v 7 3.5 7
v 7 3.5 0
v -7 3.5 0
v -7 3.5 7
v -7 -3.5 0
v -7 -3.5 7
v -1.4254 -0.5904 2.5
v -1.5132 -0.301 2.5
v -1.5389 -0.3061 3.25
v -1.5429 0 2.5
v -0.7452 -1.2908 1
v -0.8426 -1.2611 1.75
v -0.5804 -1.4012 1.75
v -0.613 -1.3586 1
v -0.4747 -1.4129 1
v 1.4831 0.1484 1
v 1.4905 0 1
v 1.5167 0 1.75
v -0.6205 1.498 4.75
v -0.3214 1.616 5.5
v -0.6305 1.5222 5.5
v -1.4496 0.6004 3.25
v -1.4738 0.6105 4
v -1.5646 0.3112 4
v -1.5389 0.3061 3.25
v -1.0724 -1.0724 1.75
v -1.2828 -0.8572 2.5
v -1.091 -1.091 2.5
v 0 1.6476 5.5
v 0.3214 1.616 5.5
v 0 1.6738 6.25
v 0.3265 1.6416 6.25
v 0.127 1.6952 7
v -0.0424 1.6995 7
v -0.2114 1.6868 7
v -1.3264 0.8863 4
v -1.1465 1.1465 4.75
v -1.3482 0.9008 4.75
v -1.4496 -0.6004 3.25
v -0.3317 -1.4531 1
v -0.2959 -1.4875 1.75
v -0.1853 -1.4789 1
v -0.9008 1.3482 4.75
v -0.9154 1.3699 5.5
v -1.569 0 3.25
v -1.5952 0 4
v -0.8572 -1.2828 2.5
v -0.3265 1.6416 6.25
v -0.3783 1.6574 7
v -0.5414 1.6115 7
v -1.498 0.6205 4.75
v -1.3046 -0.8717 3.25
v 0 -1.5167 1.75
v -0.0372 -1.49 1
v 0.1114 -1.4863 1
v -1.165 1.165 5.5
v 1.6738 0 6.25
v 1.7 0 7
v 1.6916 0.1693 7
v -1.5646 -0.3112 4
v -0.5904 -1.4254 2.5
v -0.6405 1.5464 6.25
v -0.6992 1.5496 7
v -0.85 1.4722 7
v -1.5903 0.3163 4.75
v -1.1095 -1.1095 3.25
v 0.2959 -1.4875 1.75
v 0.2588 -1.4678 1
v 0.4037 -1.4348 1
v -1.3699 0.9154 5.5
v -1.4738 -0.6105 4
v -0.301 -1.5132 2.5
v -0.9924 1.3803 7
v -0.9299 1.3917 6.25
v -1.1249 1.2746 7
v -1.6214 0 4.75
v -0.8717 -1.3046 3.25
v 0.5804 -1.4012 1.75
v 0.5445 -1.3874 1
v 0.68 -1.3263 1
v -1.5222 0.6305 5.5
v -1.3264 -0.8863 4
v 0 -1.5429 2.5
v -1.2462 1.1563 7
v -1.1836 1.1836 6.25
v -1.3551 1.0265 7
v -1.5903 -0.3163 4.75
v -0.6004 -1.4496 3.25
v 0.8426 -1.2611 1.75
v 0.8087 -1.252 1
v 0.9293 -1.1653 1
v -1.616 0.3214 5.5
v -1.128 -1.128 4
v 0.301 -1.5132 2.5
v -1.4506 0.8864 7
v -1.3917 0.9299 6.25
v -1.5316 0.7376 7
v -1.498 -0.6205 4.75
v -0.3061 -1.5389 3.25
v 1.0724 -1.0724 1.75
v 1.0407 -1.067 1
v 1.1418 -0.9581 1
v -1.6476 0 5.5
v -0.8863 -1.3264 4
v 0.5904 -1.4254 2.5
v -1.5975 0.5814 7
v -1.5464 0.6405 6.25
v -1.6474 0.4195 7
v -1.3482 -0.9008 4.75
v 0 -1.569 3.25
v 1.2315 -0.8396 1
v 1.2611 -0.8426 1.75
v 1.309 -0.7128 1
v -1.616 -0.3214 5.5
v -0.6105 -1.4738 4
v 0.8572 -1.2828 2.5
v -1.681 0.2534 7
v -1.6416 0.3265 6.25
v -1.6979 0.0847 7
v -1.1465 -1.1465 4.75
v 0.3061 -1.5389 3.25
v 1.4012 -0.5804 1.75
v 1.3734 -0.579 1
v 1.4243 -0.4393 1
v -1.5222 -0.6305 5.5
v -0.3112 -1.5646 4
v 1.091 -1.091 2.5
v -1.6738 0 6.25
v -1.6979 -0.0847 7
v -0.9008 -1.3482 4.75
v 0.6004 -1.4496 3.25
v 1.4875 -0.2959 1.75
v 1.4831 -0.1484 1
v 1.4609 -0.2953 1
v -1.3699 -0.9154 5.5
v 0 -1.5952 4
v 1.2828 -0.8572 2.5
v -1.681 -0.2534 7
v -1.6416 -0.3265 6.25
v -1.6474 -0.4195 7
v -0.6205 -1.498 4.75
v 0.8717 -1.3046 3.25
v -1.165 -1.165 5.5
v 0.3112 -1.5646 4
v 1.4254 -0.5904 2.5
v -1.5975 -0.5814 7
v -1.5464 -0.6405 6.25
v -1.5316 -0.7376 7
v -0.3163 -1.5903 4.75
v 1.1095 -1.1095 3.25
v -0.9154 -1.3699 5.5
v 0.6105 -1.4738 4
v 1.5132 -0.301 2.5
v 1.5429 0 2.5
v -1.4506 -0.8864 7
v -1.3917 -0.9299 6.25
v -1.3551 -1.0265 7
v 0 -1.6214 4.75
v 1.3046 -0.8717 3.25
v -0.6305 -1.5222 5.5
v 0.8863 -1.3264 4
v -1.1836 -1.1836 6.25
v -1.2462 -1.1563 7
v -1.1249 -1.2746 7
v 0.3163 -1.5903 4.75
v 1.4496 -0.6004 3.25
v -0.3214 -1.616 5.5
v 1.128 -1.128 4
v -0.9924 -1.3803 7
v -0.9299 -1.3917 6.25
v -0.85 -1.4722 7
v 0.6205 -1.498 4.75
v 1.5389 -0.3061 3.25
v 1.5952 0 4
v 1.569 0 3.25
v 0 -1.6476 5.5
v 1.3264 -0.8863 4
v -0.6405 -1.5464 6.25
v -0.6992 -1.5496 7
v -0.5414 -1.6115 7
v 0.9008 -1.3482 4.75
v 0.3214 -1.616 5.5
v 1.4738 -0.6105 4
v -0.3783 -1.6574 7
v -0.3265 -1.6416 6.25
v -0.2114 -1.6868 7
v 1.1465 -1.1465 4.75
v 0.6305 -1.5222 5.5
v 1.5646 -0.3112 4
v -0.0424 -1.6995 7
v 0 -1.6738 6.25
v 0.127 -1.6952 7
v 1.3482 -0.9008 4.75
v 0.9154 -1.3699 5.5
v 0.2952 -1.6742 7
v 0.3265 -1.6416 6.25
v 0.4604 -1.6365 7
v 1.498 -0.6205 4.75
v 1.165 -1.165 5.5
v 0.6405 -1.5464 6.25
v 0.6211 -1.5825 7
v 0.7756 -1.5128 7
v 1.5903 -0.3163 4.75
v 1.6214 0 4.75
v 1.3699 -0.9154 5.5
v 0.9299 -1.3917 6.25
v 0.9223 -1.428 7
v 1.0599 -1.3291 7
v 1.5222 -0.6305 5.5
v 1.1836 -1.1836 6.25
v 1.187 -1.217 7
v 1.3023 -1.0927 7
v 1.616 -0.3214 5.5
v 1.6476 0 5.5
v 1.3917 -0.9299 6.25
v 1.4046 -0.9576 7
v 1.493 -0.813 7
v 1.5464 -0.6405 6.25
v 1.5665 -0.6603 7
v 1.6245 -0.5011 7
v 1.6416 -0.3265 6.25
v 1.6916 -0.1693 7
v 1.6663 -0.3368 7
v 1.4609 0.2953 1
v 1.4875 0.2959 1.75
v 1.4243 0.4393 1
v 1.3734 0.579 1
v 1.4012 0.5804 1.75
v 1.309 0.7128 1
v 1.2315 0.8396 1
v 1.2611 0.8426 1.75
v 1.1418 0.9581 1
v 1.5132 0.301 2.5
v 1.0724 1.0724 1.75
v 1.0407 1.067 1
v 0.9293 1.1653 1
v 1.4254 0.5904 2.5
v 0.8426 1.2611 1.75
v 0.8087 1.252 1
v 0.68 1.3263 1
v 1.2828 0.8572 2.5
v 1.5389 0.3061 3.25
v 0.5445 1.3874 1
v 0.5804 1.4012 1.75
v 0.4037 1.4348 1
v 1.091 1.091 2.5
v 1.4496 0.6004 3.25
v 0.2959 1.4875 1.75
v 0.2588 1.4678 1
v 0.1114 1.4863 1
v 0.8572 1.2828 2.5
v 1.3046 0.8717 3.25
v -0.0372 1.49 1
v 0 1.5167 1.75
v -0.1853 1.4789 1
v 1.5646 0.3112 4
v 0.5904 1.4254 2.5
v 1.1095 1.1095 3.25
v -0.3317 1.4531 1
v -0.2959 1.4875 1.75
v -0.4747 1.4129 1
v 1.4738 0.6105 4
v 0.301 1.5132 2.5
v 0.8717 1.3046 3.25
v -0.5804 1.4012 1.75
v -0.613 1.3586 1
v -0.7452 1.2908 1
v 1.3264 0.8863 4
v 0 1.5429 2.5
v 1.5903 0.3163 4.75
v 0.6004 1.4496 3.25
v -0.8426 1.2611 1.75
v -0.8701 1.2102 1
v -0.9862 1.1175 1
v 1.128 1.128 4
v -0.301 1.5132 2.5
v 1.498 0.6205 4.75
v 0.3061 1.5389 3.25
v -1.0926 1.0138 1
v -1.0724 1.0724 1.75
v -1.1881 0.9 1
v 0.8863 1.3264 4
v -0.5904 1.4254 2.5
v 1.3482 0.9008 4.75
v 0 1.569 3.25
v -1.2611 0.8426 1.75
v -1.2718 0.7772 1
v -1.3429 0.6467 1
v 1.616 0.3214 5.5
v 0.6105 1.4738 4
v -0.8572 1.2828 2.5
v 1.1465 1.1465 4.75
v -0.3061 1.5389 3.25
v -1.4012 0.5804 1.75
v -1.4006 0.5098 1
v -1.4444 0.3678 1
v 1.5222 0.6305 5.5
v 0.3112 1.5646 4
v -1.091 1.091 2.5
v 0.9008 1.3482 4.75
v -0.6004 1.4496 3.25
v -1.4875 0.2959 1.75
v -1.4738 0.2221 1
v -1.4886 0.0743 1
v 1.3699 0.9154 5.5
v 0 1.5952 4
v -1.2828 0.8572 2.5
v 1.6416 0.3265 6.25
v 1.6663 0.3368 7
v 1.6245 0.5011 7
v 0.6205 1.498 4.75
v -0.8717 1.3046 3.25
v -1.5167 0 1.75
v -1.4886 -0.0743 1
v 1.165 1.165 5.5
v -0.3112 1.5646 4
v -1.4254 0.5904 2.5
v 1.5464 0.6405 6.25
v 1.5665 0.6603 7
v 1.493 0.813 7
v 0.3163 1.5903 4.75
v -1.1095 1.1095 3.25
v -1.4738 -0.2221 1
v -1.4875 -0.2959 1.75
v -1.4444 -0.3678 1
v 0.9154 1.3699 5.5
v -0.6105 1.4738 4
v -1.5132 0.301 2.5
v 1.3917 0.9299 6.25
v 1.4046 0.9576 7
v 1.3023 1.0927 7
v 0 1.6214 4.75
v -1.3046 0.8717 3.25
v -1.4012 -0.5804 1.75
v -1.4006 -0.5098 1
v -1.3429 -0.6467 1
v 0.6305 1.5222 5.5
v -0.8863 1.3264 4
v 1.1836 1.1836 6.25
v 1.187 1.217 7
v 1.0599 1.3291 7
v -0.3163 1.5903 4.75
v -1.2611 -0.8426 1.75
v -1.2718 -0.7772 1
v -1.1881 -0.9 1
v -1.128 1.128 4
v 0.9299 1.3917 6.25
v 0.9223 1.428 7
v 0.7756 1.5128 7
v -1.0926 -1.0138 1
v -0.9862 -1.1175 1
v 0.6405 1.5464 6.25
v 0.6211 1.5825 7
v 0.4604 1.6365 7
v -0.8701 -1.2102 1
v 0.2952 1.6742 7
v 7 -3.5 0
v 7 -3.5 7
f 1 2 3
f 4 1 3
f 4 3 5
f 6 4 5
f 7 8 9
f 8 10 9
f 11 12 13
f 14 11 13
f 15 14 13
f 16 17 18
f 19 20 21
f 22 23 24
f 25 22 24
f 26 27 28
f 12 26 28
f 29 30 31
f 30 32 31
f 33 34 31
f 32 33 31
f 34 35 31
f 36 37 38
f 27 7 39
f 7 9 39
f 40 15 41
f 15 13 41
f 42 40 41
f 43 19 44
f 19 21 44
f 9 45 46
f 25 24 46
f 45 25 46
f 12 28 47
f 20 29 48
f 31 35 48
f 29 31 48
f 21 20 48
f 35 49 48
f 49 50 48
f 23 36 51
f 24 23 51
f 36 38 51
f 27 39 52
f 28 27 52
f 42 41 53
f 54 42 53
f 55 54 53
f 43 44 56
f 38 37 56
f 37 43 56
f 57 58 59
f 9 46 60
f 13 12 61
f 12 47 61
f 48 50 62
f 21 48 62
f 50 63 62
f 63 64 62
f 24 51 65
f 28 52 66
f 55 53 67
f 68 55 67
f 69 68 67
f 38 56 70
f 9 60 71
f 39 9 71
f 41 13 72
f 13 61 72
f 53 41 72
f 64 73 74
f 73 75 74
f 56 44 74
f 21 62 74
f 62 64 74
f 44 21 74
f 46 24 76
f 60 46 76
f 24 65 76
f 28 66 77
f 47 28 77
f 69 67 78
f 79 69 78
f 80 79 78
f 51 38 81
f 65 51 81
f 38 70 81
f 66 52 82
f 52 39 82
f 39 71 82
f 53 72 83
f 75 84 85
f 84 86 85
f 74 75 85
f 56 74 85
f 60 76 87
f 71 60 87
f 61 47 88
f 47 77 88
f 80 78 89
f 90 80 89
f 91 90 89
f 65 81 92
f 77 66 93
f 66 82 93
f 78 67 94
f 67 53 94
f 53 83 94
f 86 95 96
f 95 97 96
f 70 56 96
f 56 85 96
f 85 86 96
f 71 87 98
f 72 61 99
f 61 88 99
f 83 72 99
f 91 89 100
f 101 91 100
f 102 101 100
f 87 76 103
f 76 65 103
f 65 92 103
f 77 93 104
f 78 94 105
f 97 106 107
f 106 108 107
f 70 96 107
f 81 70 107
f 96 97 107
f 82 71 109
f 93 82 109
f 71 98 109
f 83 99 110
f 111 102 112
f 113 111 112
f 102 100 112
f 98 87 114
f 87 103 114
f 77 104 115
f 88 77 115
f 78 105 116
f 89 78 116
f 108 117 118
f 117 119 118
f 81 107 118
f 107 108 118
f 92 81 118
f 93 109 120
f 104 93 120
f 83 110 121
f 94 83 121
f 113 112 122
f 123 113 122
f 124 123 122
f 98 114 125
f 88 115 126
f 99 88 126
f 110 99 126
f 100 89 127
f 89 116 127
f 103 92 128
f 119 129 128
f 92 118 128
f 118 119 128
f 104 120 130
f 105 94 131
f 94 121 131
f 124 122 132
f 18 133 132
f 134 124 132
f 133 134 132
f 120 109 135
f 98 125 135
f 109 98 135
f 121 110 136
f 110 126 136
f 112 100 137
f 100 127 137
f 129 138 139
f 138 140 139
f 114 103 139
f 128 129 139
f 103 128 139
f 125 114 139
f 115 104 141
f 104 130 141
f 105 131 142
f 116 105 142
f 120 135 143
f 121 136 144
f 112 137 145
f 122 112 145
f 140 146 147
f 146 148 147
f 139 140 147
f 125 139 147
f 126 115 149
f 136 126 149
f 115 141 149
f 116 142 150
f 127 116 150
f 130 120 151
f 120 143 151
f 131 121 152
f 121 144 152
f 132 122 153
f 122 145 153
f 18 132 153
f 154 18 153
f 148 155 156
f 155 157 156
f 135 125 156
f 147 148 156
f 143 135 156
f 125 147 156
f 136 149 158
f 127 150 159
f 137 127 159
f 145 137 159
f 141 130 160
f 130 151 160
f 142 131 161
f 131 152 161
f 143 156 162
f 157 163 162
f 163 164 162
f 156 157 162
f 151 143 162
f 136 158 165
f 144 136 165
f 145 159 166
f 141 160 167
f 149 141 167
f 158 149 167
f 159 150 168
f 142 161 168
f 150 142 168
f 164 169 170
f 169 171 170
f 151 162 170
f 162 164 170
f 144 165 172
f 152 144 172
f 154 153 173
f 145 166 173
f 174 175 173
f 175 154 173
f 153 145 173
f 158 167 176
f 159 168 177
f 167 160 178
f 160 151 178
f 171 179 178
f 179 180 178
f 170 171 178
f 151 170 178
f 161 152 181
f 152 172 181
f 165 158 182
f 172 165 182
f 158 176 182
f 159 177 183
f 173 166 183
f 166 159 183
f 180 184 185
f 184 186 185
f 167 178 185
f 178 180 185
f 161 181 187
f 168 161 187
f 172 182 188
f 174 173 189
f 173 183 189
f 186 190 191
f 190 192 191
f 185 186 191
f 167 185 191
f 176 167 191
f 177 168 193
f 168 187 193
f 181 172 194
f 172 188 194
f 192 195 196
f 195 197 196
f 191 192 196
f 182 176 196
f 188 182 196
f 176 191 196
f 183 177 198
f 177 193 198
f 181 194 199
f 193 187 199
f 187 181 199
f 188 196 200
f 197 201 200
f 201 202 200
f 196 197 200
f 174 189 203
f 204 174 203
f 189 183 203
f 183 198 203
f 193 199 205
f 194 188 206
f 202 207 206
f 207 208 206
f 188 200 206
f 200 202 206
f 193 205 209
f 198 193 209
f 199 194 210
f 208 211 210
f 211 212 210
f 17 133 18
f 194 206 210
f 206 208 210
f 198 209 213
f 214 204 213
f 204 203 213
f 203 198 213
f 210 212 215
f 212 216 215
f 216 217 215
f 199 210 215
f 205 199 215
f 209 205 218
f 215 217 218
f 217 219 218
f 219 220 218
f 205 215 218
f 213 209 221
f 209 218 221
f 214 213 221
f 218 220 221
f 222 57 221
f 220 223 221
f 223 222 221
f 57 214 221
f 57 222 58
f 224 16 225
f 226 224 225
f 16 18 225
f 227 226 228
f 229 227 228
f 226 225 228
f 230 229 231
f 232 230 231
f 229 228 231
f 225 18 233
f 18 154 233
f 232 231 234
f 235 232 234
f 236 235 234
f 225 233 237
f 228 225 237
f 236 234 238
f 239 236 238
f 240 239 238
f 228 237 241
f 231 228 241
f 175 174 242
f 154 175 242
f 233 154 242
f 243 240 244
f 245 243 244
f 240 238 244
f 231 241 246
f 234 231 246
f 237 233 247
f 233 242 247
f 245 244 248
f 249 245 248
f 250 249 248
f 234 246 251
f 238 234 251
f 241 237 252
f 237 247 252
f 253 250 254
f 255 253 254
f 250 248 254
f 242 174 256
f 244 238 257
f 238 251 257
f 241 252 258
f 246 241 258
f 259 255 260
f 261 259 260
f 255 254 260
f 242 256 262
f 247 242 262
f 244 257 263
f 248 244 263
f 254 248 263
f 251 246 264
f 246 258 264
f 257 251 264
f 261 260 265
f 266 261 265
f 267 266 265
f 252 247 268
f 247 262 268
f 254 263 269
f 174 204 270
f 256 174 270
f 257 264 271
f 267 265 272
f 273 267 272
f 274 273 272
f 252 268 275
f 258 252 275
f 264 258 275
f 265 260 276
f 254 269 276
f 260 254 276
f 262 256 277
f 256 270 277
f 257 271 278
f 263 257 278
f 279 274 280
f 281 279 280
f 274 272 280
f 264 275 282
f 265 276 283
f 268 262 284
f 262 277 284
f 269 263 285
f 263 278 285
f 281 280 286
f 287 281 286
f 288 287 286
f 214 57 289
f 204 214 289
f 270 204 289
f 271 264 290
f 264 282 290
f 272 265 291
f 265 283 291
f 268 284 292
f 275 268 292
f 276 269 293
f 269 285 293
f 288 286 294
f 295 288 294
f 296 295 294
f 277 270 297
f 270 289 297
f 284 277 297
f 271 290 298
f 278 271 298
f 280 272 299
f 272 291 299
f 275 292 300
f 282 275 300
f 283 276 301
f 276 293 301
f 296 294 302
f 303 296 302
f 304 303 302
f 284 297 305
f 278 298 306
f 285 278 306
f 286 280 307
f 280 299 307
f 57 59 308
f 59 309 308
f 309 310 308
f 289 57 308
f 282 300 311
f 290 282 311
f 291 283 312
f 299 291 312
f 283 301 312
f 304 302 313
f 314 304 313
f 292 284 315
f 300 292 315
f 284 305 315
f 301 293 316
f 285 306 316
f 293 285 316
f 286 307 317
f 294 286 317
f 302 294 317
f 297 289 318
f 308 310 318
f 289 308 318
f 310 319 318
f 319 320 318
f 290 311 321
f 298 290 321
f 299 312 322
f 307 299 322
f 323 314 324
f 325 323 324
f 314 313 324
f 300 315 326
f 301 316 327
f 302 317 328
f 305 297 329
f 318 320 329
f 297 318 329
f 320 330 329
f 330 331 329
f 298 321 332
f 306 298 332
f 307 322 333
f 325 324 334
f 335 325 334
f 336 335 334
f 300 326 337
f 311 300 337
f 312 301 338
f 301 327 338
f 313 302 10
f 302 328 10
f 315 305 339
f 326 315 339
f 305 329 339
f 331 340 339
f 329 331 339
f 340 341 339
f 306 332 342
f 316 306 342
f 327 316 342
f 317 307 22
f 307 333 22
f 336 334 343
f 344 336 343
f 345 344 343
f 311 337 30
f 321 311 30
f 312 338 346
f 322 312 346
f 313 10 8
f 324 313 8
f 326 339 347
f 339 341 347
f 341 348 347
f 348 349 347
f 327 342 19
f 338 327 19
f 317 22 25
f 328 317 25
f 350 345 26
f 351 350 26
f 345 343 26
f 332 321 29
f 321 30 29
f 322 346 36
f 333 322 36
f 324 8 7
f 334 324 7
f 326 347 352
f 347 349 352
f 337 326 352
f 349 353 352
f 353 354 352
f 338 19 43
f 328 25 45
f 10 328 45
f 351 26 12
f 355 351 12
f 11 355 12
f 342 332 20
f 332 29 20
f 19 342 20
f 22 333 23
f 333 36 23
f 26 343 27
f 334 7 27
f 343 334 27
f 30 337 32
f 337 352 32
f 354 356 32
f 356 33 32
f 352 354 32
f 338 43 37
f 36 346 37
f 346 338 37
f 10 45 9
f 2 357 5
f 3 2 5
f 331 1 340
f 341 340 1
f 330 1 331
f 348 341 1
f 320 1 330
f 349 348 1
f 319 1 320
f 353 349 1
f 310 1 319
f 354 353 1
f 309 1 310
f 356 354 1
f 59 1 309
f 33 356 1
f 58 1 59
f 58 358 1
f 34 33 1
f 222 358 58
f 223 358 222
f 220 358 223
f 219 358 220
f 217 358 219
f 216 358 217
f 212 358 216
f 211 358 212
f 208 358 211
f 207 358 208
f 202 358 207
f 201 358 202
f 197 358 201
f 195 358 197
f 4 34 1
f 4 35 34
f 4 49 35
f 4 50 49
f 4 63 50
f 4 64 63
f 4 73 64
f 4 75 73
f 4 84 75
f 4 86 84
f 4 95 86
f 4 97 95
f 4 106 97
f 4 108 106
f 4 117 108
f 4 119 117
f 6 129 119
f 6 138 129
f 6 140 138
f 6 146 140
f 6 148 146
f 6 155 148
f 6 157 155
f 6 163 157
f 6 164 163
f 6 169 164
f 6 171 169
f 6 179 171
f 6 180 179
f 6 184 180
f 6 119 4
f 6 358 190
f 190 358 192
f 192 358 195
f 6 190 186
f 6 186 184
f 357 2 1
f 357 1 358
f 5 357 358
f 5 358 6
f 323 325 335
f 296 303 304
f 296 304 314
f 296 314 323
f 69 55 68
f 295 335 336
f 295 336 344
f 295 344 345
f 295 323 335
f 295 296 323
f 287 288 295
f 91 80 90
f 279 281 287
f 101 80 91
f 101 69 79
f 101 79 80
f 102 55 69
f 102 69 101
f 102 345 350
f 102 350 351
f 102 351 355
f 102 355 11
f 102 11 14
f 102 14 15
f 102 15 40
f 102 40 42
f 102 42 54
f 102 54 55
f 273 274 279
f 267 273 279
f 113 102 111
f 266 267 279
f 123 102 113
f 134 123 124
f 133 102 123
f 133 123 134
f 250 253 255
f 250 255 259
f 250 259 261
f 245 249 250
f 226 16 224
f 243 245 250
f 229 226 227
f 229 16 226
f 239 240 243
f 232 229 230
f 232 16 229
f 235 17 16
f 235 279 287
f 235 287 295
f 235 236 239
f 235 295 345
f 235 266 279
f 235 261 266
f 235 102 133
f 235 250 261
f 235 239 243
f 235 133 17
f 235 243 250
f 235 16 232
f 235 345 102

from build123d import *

# Parameters (mm, degrees)
SKETCH_1_W          = 14
SKETCH_1_H          = 7
EXTRUDE_1_DEPTH     = 7
SKETCH_2_R          = 1.7
CUT_EXTRUDE_1_DEPTH = 6
CUT_EXTRUDE_1_DRAFT = -2


with BuildPart() as part:
    # Эскиз1 → Бобышка-Вытянуть1 (new body)
    with BuildSketch(Plane(origin=(0, 66.754264805, 0), x_dir=(-1, 0, 0), z_dir=(0, 0, 1))):
        with Locations((0, 66.754264805)):
            Rectangle(SKETCH_1_W, SKETCH_1_H)
    extrude(amount=EXTRUDE_1_DEPTH)


with BuildPart() as cut_extrude_1_tool:
    # Эскиз2 → Вырез-Вытянуть1 (with draft: the straight prism first)
    with BuildSketch(Plane.XY.offset(7)):
        Circle(SKETCH_2_R)
    extrude(amount=-CUT_EXTRUDE_1_DEPTH)
    # Вырез-Вытянуть1: the draft: its side faces are tilted about the plane it starts from
    cut_extrude_1_sides = [cut_extrude_1_tool.faces().sort_by_distance(p)[0] for p in [
        (-1.7, 0, 4),
    ]]
    draft(cut_extrude_1_sides, Plane.XY.offset(7), CUT_EXTRUDE_1_DRAFT)


with BuildPart() as part_1:
    add(part.part)

    # Вырез-Вытянуть1: cut by cut_extrude_1_tool
    add(cut_extrude_1_tool.part, mode=Mode.SUBTRACT)


solid = part_1.part
